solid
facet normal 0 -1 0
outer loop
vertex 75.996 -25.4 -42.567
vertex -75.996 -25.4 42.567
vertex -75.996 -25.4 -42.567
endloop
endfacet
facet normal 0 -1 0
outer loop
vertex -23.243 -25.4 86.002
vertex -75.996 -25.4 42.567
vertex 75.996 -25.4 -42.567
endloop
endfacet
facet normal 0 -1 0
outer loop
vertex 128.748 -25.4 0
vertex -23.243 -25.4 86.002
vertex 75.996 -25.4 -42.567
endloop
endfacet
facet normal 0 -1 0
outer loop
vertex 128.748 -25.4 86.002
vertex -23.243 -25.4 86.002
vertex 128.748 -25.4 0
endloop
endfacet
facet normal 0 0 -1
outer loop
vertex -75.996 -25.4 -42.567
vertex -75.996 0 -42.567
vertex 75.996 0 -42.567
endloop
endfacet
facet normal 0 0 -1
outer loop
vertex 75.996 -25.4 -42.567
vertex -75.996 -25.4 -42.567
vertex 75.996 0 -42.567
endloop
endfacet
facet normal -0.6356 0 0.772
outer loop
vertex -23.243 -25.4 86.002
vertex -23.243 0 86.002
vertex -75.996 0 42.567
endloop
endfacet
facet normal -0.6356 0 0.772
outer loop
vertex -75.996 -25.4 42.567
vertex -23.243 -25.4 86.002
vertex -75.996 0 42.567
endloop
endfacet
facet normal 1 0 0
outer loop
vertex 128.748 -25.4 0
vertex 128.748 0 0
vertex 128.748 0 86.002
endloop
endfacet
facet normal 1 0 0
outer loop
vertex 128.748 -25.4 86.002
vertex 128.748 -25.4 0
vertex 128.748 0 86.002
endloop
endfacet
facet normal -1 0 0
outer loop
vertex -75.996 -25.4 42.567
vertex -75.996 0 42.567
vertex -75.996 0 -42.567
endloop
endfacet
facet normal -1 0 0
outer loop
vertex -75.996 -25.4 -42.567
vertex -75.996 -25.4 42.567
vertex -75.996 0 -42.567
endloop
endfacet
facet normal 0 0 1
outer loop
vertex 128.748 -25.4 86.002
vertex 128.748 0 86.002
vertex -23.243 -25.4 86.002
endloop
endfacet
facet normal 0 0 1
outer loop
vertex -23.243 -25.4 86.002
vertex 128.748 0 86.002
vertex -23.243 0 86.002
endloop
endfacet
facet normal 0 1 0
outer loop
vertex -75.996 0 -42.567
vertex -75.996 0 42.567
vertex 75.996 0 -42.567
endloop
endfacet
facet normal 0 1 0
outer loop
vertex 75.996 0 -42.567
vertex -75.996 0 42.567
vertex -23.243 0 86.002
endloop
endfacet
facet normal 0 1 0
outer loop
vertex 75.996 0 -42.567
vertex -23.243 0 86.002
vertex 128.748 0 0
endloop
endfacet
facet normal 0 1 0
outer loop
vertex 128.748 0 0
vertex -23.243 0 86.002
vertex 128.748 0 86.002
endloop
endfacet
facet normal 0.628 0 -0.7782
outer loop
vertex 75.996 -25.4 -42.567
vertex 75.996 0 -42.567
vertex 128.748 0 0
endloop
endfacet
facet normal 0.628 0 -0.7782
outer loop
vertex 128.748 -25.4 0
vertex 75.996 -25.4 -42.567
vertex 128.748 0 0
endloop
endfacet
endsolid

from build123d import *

# Parameters (mm, degrees)
F1_DEPTH = 25.4


with BuildPart() as f1:
    # F0 (on Front) → F1 (new body)
    with BuildSketch(Plane.XZ):
        Polygon((-75.995557, -42.566791), (75.995557, -42.566791), (75.995557, 0), (-18.541871, 0), (-22.720322, 0), align=None)
        Polygon((75.995557, 0), (75.995557, -42.566791), (128.748477, 0), align=None)
        Polygon((-75.995557, 42.566791), (-75.995557, -42.566791), (-22.720322, 0), (-22.978842, 42.566791), align=None)
        Polygon((75.995557, 42.566791), (75.995557, 0), (128.748477, 0), (128.748477, 86.002111), align=None)
        Polygon((-23.242638, 86.002111), (-75.995557, 42.566791), (-22.978842, 42.566791), align=None)
        Polygon((-22.978842, 42.566791), (75.995557, 42.566791), (128.748477, 86.002111), (0, 86.002111), (-23.242638, 86.002111), align=None)
        Polygon((-18.541871, 0), (75.995557, 0), (75.995557, 42.566791), (-22.978842, 42.566791), (-22.720322, 0), align=None)
    extrude(amount=F1_DEPTH)


solid = f1.part
